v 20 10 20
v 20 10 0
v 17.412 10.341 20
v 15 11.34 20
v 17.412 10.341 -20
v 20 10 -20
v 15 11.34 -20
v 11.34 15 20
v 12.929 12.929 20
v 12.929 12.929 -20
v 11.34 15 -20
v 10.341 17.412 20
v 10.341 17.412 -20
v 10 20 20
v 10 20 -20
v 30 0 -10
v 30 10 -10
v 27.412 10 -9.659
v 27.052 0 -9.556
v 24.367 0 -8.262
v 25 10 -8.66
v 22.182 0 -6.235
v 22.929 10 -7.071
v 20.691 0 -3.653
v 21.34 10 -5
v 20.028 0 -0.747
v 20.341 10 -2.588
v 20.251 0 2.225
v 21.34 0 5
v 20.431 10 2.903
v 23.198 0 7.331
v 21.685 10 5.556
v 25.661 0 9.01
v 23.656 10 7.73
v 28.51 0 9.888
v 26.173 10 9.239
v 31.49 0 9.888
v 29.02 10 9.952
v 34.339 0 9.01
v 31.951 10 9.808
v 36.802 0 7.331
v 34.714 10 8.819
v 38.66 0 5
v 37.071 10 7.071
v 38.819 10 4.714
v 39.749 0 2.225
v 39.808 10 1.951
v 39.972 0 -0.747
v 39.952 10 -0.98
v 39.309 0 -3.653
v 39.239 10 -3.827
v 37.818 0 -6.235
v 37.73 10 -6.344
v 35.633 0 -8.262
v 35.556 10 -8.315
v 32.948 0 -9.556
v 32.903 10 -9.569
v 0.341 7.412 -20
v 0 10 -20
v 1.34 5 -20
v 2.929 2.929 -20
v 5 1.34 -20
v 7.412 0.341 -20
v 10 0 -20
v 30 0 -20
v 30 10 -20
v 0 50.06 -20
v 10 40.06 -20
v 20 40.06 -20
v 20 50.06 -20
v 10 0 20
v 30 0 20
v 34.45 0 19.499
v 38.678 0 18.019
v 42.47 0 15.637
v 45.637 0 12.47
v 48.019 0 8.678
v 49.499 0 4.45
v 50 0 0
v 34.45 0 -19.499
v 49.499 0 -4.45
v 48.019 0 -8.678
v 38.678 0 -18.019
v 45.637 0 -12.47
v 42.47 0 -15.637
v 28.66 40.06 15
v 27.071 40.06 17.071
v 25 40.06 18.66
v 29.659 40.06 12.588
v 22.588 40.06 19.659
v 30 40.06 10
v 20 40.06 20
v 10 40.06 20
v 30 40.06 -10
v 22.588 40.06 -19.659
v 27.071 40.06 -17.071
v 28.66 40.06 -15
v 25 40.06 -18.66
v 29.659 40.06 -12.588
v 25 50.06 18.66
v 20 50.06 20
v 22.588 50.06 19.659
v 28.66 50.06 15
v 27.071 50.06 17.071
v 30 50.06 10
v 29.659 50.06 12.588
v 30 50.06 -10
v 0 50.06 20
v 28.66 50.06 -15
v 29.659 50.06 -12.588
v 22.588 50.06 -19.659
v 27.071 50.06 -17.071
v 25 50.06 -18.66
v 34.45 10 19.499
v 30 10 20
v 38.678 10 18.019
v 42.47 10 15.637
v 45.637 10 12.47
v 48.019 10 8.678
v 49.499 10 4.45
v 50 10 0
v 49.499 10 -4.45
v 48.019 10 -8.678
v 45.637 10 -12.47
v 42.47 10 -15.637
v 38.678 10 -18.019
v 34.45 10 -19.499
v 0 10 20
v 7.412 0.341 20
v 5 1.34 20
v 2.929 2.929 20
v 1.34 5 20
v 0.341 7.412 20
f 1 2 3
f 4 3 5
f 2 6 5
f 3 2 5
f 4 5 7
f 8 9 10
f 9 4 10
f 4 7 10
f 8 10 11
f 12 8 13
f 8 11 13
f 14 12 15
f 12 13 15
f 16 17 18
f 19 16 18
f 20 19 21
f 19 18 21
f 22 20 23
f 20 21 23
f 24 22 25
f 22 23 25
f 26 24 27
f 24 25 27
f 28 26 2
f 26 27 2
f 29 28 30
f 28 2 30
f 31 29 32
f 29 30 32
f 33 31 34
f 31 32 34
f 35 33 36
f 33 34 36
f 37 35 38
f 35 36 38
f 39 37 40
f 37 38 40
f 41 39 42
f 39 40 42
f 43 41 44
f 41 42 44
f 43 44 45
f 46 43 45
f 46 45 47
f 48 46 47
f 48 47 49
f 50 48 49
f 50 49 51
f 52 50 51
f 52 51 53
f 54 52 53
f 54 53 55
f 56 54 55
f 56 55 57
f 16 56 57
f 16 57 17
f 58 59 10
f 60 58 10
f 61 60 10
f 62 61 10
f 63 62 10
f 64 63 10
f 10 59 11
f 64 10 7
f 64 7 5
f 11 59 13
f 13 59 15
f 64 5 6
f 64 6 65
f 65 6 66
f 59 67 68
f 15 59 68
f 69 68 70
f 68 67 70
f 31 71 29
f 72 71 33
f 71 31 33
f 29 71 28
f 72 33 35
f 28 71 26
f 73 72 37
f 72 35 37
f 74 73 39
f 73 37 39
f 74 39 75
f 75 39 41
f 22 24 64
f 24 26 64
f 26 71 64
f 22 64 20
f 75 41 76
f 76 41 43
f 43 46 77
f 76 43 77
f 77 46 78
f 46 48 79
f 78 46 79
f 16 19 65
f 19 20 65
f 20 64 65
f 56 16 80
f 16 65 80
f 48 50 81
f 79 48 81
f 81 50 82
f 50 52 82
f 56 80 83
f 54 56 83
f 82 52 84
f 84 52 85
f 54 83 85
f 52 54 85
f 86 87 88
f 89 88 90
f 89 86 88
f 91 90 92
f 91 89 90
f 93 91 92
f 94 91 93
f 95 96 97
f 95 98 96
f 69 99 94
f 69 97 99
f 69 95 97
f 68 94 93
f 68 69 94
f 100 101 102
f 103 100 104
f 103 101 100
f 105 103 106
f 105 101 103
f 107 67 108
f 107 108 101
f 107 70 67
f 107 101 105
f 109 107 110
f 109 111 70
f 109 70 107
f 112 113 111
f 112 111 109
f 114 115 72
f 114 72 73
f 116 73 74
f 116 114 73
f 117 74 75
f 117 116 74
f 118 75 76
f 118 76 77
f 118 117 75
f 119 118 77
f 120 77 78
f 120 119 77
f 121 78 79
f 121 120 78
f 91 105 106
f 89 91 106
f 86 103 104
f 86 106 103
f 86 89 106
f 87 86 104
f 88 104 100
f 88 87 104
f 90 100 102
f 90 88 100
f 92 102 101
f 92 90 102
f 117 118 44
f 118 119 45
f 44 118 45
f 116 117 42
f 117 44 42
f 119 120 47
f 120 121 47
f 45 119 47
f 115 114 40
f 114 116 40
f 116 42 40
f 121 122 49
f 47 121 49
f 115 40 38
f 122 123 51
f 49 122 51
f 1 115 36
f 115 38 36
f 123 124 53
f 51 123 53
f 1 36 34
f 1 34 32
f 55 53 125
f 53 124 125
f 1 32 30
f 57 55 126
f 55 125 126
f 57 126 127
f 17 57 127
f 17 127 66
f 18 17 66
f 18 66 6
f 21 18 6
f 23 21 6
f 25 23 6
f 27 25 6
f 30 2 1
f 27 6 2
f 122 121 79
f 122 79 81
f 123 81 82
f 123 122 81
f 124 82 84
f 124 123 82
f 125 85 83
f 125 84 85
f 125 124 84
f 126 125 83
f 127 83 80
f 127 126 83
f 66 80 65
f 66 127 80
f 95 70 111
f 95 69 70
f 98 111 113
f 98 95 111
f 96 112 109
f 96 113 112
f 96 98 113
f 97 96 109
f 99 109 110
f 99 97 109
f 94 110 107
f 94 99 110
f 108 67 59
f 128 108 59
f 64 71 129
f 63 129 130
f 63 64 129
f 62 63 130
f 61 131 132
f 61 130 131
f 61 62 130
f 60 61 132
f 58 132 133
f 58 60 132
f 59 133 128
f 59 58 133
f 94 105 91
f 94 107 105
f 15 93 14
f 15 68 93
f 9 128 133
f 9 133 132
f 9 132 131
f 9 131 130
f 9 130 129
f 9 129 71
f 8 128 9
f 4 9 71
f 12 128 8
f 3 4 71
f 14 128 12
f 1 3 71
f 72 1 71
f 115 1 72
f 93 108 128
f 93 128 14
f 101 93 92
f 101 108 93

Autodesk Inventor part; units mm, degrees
ref_plane "YZ Plane" through (0, 0, 0) normal (1, 0, 0) x (0, 1, 0)
ref_plane "XZ Plane" through (0, 0, 0) normal (0, 1, 0) x (-1, 0, 0)
ref_plane "XY Plane" through (0, 0, 0) normal (0, 0, 1) x (1, 0, 0)
sketch "Sketch1" plane through (0, 0, 0) normal (0, 0, 1) x (1, 0, 0)
  line L0 (0, 60.4862) -> (0, -12.4973) projected
  line L1 (-12.4853, 0) -> (60.4142, 0) projected
  line L2 (0, 50.06) -> (30, 50.06)
  line L3 (30, 50.06) -> (30, 40.06)
  line L4 (30, 40.06) -> (10, 40.06)
  line L5 (0, 40.06) -> (0, 50.06)
  line L6 (10, 0) -> (50, 0)
  line L7 (50, 0) -> (50, 10)
  line L8 (50, 10) -> (20, 10)
  line L9 (0, 10) -> (0, 10)
  line L10 (10, 40.06) -> (10, 20)
  line L11 (0, 10) -> (0, 40.06)
  arc A0 (0, 10) -> (10, 0) centre (10, 10) ccw
  arc A1 (10, 20) -> (20, 10) centre (20, 20) ccw
  point P0 (0, 0)
  dimension "d0" = 30
  dimension "d2" = 50
  dimension "d3" = 10
  dimension "d5" = 10
  dimension "d6" = 10
extrude "Extrusion1" add sketch "Sketch1" along normal mid plane 40 contours L2 L3 L4 L10 A1 L8 L7 L1 A0 L0
fillet "Fillet1" radius 20 2 edges at (50, 5, 20) (50, 5, -20)
fillet "Fillet2" radius 10 2 edges at (30, 45.06, 20) (30, 45.06, -20)
sketch "Sketch2" plane through (10, 0, -20) normal (0, -1, 0) x (1, 0, 0)
  arc A0 (20, 0) -> (20, 40) centre (20, 20) ccw projected
  point P0 (-10, 20)
hole "Hole1" at (30, 0, 0) direction (0, 1, 0) diameter 20 depth 10
properties part number "Exercise_3"
